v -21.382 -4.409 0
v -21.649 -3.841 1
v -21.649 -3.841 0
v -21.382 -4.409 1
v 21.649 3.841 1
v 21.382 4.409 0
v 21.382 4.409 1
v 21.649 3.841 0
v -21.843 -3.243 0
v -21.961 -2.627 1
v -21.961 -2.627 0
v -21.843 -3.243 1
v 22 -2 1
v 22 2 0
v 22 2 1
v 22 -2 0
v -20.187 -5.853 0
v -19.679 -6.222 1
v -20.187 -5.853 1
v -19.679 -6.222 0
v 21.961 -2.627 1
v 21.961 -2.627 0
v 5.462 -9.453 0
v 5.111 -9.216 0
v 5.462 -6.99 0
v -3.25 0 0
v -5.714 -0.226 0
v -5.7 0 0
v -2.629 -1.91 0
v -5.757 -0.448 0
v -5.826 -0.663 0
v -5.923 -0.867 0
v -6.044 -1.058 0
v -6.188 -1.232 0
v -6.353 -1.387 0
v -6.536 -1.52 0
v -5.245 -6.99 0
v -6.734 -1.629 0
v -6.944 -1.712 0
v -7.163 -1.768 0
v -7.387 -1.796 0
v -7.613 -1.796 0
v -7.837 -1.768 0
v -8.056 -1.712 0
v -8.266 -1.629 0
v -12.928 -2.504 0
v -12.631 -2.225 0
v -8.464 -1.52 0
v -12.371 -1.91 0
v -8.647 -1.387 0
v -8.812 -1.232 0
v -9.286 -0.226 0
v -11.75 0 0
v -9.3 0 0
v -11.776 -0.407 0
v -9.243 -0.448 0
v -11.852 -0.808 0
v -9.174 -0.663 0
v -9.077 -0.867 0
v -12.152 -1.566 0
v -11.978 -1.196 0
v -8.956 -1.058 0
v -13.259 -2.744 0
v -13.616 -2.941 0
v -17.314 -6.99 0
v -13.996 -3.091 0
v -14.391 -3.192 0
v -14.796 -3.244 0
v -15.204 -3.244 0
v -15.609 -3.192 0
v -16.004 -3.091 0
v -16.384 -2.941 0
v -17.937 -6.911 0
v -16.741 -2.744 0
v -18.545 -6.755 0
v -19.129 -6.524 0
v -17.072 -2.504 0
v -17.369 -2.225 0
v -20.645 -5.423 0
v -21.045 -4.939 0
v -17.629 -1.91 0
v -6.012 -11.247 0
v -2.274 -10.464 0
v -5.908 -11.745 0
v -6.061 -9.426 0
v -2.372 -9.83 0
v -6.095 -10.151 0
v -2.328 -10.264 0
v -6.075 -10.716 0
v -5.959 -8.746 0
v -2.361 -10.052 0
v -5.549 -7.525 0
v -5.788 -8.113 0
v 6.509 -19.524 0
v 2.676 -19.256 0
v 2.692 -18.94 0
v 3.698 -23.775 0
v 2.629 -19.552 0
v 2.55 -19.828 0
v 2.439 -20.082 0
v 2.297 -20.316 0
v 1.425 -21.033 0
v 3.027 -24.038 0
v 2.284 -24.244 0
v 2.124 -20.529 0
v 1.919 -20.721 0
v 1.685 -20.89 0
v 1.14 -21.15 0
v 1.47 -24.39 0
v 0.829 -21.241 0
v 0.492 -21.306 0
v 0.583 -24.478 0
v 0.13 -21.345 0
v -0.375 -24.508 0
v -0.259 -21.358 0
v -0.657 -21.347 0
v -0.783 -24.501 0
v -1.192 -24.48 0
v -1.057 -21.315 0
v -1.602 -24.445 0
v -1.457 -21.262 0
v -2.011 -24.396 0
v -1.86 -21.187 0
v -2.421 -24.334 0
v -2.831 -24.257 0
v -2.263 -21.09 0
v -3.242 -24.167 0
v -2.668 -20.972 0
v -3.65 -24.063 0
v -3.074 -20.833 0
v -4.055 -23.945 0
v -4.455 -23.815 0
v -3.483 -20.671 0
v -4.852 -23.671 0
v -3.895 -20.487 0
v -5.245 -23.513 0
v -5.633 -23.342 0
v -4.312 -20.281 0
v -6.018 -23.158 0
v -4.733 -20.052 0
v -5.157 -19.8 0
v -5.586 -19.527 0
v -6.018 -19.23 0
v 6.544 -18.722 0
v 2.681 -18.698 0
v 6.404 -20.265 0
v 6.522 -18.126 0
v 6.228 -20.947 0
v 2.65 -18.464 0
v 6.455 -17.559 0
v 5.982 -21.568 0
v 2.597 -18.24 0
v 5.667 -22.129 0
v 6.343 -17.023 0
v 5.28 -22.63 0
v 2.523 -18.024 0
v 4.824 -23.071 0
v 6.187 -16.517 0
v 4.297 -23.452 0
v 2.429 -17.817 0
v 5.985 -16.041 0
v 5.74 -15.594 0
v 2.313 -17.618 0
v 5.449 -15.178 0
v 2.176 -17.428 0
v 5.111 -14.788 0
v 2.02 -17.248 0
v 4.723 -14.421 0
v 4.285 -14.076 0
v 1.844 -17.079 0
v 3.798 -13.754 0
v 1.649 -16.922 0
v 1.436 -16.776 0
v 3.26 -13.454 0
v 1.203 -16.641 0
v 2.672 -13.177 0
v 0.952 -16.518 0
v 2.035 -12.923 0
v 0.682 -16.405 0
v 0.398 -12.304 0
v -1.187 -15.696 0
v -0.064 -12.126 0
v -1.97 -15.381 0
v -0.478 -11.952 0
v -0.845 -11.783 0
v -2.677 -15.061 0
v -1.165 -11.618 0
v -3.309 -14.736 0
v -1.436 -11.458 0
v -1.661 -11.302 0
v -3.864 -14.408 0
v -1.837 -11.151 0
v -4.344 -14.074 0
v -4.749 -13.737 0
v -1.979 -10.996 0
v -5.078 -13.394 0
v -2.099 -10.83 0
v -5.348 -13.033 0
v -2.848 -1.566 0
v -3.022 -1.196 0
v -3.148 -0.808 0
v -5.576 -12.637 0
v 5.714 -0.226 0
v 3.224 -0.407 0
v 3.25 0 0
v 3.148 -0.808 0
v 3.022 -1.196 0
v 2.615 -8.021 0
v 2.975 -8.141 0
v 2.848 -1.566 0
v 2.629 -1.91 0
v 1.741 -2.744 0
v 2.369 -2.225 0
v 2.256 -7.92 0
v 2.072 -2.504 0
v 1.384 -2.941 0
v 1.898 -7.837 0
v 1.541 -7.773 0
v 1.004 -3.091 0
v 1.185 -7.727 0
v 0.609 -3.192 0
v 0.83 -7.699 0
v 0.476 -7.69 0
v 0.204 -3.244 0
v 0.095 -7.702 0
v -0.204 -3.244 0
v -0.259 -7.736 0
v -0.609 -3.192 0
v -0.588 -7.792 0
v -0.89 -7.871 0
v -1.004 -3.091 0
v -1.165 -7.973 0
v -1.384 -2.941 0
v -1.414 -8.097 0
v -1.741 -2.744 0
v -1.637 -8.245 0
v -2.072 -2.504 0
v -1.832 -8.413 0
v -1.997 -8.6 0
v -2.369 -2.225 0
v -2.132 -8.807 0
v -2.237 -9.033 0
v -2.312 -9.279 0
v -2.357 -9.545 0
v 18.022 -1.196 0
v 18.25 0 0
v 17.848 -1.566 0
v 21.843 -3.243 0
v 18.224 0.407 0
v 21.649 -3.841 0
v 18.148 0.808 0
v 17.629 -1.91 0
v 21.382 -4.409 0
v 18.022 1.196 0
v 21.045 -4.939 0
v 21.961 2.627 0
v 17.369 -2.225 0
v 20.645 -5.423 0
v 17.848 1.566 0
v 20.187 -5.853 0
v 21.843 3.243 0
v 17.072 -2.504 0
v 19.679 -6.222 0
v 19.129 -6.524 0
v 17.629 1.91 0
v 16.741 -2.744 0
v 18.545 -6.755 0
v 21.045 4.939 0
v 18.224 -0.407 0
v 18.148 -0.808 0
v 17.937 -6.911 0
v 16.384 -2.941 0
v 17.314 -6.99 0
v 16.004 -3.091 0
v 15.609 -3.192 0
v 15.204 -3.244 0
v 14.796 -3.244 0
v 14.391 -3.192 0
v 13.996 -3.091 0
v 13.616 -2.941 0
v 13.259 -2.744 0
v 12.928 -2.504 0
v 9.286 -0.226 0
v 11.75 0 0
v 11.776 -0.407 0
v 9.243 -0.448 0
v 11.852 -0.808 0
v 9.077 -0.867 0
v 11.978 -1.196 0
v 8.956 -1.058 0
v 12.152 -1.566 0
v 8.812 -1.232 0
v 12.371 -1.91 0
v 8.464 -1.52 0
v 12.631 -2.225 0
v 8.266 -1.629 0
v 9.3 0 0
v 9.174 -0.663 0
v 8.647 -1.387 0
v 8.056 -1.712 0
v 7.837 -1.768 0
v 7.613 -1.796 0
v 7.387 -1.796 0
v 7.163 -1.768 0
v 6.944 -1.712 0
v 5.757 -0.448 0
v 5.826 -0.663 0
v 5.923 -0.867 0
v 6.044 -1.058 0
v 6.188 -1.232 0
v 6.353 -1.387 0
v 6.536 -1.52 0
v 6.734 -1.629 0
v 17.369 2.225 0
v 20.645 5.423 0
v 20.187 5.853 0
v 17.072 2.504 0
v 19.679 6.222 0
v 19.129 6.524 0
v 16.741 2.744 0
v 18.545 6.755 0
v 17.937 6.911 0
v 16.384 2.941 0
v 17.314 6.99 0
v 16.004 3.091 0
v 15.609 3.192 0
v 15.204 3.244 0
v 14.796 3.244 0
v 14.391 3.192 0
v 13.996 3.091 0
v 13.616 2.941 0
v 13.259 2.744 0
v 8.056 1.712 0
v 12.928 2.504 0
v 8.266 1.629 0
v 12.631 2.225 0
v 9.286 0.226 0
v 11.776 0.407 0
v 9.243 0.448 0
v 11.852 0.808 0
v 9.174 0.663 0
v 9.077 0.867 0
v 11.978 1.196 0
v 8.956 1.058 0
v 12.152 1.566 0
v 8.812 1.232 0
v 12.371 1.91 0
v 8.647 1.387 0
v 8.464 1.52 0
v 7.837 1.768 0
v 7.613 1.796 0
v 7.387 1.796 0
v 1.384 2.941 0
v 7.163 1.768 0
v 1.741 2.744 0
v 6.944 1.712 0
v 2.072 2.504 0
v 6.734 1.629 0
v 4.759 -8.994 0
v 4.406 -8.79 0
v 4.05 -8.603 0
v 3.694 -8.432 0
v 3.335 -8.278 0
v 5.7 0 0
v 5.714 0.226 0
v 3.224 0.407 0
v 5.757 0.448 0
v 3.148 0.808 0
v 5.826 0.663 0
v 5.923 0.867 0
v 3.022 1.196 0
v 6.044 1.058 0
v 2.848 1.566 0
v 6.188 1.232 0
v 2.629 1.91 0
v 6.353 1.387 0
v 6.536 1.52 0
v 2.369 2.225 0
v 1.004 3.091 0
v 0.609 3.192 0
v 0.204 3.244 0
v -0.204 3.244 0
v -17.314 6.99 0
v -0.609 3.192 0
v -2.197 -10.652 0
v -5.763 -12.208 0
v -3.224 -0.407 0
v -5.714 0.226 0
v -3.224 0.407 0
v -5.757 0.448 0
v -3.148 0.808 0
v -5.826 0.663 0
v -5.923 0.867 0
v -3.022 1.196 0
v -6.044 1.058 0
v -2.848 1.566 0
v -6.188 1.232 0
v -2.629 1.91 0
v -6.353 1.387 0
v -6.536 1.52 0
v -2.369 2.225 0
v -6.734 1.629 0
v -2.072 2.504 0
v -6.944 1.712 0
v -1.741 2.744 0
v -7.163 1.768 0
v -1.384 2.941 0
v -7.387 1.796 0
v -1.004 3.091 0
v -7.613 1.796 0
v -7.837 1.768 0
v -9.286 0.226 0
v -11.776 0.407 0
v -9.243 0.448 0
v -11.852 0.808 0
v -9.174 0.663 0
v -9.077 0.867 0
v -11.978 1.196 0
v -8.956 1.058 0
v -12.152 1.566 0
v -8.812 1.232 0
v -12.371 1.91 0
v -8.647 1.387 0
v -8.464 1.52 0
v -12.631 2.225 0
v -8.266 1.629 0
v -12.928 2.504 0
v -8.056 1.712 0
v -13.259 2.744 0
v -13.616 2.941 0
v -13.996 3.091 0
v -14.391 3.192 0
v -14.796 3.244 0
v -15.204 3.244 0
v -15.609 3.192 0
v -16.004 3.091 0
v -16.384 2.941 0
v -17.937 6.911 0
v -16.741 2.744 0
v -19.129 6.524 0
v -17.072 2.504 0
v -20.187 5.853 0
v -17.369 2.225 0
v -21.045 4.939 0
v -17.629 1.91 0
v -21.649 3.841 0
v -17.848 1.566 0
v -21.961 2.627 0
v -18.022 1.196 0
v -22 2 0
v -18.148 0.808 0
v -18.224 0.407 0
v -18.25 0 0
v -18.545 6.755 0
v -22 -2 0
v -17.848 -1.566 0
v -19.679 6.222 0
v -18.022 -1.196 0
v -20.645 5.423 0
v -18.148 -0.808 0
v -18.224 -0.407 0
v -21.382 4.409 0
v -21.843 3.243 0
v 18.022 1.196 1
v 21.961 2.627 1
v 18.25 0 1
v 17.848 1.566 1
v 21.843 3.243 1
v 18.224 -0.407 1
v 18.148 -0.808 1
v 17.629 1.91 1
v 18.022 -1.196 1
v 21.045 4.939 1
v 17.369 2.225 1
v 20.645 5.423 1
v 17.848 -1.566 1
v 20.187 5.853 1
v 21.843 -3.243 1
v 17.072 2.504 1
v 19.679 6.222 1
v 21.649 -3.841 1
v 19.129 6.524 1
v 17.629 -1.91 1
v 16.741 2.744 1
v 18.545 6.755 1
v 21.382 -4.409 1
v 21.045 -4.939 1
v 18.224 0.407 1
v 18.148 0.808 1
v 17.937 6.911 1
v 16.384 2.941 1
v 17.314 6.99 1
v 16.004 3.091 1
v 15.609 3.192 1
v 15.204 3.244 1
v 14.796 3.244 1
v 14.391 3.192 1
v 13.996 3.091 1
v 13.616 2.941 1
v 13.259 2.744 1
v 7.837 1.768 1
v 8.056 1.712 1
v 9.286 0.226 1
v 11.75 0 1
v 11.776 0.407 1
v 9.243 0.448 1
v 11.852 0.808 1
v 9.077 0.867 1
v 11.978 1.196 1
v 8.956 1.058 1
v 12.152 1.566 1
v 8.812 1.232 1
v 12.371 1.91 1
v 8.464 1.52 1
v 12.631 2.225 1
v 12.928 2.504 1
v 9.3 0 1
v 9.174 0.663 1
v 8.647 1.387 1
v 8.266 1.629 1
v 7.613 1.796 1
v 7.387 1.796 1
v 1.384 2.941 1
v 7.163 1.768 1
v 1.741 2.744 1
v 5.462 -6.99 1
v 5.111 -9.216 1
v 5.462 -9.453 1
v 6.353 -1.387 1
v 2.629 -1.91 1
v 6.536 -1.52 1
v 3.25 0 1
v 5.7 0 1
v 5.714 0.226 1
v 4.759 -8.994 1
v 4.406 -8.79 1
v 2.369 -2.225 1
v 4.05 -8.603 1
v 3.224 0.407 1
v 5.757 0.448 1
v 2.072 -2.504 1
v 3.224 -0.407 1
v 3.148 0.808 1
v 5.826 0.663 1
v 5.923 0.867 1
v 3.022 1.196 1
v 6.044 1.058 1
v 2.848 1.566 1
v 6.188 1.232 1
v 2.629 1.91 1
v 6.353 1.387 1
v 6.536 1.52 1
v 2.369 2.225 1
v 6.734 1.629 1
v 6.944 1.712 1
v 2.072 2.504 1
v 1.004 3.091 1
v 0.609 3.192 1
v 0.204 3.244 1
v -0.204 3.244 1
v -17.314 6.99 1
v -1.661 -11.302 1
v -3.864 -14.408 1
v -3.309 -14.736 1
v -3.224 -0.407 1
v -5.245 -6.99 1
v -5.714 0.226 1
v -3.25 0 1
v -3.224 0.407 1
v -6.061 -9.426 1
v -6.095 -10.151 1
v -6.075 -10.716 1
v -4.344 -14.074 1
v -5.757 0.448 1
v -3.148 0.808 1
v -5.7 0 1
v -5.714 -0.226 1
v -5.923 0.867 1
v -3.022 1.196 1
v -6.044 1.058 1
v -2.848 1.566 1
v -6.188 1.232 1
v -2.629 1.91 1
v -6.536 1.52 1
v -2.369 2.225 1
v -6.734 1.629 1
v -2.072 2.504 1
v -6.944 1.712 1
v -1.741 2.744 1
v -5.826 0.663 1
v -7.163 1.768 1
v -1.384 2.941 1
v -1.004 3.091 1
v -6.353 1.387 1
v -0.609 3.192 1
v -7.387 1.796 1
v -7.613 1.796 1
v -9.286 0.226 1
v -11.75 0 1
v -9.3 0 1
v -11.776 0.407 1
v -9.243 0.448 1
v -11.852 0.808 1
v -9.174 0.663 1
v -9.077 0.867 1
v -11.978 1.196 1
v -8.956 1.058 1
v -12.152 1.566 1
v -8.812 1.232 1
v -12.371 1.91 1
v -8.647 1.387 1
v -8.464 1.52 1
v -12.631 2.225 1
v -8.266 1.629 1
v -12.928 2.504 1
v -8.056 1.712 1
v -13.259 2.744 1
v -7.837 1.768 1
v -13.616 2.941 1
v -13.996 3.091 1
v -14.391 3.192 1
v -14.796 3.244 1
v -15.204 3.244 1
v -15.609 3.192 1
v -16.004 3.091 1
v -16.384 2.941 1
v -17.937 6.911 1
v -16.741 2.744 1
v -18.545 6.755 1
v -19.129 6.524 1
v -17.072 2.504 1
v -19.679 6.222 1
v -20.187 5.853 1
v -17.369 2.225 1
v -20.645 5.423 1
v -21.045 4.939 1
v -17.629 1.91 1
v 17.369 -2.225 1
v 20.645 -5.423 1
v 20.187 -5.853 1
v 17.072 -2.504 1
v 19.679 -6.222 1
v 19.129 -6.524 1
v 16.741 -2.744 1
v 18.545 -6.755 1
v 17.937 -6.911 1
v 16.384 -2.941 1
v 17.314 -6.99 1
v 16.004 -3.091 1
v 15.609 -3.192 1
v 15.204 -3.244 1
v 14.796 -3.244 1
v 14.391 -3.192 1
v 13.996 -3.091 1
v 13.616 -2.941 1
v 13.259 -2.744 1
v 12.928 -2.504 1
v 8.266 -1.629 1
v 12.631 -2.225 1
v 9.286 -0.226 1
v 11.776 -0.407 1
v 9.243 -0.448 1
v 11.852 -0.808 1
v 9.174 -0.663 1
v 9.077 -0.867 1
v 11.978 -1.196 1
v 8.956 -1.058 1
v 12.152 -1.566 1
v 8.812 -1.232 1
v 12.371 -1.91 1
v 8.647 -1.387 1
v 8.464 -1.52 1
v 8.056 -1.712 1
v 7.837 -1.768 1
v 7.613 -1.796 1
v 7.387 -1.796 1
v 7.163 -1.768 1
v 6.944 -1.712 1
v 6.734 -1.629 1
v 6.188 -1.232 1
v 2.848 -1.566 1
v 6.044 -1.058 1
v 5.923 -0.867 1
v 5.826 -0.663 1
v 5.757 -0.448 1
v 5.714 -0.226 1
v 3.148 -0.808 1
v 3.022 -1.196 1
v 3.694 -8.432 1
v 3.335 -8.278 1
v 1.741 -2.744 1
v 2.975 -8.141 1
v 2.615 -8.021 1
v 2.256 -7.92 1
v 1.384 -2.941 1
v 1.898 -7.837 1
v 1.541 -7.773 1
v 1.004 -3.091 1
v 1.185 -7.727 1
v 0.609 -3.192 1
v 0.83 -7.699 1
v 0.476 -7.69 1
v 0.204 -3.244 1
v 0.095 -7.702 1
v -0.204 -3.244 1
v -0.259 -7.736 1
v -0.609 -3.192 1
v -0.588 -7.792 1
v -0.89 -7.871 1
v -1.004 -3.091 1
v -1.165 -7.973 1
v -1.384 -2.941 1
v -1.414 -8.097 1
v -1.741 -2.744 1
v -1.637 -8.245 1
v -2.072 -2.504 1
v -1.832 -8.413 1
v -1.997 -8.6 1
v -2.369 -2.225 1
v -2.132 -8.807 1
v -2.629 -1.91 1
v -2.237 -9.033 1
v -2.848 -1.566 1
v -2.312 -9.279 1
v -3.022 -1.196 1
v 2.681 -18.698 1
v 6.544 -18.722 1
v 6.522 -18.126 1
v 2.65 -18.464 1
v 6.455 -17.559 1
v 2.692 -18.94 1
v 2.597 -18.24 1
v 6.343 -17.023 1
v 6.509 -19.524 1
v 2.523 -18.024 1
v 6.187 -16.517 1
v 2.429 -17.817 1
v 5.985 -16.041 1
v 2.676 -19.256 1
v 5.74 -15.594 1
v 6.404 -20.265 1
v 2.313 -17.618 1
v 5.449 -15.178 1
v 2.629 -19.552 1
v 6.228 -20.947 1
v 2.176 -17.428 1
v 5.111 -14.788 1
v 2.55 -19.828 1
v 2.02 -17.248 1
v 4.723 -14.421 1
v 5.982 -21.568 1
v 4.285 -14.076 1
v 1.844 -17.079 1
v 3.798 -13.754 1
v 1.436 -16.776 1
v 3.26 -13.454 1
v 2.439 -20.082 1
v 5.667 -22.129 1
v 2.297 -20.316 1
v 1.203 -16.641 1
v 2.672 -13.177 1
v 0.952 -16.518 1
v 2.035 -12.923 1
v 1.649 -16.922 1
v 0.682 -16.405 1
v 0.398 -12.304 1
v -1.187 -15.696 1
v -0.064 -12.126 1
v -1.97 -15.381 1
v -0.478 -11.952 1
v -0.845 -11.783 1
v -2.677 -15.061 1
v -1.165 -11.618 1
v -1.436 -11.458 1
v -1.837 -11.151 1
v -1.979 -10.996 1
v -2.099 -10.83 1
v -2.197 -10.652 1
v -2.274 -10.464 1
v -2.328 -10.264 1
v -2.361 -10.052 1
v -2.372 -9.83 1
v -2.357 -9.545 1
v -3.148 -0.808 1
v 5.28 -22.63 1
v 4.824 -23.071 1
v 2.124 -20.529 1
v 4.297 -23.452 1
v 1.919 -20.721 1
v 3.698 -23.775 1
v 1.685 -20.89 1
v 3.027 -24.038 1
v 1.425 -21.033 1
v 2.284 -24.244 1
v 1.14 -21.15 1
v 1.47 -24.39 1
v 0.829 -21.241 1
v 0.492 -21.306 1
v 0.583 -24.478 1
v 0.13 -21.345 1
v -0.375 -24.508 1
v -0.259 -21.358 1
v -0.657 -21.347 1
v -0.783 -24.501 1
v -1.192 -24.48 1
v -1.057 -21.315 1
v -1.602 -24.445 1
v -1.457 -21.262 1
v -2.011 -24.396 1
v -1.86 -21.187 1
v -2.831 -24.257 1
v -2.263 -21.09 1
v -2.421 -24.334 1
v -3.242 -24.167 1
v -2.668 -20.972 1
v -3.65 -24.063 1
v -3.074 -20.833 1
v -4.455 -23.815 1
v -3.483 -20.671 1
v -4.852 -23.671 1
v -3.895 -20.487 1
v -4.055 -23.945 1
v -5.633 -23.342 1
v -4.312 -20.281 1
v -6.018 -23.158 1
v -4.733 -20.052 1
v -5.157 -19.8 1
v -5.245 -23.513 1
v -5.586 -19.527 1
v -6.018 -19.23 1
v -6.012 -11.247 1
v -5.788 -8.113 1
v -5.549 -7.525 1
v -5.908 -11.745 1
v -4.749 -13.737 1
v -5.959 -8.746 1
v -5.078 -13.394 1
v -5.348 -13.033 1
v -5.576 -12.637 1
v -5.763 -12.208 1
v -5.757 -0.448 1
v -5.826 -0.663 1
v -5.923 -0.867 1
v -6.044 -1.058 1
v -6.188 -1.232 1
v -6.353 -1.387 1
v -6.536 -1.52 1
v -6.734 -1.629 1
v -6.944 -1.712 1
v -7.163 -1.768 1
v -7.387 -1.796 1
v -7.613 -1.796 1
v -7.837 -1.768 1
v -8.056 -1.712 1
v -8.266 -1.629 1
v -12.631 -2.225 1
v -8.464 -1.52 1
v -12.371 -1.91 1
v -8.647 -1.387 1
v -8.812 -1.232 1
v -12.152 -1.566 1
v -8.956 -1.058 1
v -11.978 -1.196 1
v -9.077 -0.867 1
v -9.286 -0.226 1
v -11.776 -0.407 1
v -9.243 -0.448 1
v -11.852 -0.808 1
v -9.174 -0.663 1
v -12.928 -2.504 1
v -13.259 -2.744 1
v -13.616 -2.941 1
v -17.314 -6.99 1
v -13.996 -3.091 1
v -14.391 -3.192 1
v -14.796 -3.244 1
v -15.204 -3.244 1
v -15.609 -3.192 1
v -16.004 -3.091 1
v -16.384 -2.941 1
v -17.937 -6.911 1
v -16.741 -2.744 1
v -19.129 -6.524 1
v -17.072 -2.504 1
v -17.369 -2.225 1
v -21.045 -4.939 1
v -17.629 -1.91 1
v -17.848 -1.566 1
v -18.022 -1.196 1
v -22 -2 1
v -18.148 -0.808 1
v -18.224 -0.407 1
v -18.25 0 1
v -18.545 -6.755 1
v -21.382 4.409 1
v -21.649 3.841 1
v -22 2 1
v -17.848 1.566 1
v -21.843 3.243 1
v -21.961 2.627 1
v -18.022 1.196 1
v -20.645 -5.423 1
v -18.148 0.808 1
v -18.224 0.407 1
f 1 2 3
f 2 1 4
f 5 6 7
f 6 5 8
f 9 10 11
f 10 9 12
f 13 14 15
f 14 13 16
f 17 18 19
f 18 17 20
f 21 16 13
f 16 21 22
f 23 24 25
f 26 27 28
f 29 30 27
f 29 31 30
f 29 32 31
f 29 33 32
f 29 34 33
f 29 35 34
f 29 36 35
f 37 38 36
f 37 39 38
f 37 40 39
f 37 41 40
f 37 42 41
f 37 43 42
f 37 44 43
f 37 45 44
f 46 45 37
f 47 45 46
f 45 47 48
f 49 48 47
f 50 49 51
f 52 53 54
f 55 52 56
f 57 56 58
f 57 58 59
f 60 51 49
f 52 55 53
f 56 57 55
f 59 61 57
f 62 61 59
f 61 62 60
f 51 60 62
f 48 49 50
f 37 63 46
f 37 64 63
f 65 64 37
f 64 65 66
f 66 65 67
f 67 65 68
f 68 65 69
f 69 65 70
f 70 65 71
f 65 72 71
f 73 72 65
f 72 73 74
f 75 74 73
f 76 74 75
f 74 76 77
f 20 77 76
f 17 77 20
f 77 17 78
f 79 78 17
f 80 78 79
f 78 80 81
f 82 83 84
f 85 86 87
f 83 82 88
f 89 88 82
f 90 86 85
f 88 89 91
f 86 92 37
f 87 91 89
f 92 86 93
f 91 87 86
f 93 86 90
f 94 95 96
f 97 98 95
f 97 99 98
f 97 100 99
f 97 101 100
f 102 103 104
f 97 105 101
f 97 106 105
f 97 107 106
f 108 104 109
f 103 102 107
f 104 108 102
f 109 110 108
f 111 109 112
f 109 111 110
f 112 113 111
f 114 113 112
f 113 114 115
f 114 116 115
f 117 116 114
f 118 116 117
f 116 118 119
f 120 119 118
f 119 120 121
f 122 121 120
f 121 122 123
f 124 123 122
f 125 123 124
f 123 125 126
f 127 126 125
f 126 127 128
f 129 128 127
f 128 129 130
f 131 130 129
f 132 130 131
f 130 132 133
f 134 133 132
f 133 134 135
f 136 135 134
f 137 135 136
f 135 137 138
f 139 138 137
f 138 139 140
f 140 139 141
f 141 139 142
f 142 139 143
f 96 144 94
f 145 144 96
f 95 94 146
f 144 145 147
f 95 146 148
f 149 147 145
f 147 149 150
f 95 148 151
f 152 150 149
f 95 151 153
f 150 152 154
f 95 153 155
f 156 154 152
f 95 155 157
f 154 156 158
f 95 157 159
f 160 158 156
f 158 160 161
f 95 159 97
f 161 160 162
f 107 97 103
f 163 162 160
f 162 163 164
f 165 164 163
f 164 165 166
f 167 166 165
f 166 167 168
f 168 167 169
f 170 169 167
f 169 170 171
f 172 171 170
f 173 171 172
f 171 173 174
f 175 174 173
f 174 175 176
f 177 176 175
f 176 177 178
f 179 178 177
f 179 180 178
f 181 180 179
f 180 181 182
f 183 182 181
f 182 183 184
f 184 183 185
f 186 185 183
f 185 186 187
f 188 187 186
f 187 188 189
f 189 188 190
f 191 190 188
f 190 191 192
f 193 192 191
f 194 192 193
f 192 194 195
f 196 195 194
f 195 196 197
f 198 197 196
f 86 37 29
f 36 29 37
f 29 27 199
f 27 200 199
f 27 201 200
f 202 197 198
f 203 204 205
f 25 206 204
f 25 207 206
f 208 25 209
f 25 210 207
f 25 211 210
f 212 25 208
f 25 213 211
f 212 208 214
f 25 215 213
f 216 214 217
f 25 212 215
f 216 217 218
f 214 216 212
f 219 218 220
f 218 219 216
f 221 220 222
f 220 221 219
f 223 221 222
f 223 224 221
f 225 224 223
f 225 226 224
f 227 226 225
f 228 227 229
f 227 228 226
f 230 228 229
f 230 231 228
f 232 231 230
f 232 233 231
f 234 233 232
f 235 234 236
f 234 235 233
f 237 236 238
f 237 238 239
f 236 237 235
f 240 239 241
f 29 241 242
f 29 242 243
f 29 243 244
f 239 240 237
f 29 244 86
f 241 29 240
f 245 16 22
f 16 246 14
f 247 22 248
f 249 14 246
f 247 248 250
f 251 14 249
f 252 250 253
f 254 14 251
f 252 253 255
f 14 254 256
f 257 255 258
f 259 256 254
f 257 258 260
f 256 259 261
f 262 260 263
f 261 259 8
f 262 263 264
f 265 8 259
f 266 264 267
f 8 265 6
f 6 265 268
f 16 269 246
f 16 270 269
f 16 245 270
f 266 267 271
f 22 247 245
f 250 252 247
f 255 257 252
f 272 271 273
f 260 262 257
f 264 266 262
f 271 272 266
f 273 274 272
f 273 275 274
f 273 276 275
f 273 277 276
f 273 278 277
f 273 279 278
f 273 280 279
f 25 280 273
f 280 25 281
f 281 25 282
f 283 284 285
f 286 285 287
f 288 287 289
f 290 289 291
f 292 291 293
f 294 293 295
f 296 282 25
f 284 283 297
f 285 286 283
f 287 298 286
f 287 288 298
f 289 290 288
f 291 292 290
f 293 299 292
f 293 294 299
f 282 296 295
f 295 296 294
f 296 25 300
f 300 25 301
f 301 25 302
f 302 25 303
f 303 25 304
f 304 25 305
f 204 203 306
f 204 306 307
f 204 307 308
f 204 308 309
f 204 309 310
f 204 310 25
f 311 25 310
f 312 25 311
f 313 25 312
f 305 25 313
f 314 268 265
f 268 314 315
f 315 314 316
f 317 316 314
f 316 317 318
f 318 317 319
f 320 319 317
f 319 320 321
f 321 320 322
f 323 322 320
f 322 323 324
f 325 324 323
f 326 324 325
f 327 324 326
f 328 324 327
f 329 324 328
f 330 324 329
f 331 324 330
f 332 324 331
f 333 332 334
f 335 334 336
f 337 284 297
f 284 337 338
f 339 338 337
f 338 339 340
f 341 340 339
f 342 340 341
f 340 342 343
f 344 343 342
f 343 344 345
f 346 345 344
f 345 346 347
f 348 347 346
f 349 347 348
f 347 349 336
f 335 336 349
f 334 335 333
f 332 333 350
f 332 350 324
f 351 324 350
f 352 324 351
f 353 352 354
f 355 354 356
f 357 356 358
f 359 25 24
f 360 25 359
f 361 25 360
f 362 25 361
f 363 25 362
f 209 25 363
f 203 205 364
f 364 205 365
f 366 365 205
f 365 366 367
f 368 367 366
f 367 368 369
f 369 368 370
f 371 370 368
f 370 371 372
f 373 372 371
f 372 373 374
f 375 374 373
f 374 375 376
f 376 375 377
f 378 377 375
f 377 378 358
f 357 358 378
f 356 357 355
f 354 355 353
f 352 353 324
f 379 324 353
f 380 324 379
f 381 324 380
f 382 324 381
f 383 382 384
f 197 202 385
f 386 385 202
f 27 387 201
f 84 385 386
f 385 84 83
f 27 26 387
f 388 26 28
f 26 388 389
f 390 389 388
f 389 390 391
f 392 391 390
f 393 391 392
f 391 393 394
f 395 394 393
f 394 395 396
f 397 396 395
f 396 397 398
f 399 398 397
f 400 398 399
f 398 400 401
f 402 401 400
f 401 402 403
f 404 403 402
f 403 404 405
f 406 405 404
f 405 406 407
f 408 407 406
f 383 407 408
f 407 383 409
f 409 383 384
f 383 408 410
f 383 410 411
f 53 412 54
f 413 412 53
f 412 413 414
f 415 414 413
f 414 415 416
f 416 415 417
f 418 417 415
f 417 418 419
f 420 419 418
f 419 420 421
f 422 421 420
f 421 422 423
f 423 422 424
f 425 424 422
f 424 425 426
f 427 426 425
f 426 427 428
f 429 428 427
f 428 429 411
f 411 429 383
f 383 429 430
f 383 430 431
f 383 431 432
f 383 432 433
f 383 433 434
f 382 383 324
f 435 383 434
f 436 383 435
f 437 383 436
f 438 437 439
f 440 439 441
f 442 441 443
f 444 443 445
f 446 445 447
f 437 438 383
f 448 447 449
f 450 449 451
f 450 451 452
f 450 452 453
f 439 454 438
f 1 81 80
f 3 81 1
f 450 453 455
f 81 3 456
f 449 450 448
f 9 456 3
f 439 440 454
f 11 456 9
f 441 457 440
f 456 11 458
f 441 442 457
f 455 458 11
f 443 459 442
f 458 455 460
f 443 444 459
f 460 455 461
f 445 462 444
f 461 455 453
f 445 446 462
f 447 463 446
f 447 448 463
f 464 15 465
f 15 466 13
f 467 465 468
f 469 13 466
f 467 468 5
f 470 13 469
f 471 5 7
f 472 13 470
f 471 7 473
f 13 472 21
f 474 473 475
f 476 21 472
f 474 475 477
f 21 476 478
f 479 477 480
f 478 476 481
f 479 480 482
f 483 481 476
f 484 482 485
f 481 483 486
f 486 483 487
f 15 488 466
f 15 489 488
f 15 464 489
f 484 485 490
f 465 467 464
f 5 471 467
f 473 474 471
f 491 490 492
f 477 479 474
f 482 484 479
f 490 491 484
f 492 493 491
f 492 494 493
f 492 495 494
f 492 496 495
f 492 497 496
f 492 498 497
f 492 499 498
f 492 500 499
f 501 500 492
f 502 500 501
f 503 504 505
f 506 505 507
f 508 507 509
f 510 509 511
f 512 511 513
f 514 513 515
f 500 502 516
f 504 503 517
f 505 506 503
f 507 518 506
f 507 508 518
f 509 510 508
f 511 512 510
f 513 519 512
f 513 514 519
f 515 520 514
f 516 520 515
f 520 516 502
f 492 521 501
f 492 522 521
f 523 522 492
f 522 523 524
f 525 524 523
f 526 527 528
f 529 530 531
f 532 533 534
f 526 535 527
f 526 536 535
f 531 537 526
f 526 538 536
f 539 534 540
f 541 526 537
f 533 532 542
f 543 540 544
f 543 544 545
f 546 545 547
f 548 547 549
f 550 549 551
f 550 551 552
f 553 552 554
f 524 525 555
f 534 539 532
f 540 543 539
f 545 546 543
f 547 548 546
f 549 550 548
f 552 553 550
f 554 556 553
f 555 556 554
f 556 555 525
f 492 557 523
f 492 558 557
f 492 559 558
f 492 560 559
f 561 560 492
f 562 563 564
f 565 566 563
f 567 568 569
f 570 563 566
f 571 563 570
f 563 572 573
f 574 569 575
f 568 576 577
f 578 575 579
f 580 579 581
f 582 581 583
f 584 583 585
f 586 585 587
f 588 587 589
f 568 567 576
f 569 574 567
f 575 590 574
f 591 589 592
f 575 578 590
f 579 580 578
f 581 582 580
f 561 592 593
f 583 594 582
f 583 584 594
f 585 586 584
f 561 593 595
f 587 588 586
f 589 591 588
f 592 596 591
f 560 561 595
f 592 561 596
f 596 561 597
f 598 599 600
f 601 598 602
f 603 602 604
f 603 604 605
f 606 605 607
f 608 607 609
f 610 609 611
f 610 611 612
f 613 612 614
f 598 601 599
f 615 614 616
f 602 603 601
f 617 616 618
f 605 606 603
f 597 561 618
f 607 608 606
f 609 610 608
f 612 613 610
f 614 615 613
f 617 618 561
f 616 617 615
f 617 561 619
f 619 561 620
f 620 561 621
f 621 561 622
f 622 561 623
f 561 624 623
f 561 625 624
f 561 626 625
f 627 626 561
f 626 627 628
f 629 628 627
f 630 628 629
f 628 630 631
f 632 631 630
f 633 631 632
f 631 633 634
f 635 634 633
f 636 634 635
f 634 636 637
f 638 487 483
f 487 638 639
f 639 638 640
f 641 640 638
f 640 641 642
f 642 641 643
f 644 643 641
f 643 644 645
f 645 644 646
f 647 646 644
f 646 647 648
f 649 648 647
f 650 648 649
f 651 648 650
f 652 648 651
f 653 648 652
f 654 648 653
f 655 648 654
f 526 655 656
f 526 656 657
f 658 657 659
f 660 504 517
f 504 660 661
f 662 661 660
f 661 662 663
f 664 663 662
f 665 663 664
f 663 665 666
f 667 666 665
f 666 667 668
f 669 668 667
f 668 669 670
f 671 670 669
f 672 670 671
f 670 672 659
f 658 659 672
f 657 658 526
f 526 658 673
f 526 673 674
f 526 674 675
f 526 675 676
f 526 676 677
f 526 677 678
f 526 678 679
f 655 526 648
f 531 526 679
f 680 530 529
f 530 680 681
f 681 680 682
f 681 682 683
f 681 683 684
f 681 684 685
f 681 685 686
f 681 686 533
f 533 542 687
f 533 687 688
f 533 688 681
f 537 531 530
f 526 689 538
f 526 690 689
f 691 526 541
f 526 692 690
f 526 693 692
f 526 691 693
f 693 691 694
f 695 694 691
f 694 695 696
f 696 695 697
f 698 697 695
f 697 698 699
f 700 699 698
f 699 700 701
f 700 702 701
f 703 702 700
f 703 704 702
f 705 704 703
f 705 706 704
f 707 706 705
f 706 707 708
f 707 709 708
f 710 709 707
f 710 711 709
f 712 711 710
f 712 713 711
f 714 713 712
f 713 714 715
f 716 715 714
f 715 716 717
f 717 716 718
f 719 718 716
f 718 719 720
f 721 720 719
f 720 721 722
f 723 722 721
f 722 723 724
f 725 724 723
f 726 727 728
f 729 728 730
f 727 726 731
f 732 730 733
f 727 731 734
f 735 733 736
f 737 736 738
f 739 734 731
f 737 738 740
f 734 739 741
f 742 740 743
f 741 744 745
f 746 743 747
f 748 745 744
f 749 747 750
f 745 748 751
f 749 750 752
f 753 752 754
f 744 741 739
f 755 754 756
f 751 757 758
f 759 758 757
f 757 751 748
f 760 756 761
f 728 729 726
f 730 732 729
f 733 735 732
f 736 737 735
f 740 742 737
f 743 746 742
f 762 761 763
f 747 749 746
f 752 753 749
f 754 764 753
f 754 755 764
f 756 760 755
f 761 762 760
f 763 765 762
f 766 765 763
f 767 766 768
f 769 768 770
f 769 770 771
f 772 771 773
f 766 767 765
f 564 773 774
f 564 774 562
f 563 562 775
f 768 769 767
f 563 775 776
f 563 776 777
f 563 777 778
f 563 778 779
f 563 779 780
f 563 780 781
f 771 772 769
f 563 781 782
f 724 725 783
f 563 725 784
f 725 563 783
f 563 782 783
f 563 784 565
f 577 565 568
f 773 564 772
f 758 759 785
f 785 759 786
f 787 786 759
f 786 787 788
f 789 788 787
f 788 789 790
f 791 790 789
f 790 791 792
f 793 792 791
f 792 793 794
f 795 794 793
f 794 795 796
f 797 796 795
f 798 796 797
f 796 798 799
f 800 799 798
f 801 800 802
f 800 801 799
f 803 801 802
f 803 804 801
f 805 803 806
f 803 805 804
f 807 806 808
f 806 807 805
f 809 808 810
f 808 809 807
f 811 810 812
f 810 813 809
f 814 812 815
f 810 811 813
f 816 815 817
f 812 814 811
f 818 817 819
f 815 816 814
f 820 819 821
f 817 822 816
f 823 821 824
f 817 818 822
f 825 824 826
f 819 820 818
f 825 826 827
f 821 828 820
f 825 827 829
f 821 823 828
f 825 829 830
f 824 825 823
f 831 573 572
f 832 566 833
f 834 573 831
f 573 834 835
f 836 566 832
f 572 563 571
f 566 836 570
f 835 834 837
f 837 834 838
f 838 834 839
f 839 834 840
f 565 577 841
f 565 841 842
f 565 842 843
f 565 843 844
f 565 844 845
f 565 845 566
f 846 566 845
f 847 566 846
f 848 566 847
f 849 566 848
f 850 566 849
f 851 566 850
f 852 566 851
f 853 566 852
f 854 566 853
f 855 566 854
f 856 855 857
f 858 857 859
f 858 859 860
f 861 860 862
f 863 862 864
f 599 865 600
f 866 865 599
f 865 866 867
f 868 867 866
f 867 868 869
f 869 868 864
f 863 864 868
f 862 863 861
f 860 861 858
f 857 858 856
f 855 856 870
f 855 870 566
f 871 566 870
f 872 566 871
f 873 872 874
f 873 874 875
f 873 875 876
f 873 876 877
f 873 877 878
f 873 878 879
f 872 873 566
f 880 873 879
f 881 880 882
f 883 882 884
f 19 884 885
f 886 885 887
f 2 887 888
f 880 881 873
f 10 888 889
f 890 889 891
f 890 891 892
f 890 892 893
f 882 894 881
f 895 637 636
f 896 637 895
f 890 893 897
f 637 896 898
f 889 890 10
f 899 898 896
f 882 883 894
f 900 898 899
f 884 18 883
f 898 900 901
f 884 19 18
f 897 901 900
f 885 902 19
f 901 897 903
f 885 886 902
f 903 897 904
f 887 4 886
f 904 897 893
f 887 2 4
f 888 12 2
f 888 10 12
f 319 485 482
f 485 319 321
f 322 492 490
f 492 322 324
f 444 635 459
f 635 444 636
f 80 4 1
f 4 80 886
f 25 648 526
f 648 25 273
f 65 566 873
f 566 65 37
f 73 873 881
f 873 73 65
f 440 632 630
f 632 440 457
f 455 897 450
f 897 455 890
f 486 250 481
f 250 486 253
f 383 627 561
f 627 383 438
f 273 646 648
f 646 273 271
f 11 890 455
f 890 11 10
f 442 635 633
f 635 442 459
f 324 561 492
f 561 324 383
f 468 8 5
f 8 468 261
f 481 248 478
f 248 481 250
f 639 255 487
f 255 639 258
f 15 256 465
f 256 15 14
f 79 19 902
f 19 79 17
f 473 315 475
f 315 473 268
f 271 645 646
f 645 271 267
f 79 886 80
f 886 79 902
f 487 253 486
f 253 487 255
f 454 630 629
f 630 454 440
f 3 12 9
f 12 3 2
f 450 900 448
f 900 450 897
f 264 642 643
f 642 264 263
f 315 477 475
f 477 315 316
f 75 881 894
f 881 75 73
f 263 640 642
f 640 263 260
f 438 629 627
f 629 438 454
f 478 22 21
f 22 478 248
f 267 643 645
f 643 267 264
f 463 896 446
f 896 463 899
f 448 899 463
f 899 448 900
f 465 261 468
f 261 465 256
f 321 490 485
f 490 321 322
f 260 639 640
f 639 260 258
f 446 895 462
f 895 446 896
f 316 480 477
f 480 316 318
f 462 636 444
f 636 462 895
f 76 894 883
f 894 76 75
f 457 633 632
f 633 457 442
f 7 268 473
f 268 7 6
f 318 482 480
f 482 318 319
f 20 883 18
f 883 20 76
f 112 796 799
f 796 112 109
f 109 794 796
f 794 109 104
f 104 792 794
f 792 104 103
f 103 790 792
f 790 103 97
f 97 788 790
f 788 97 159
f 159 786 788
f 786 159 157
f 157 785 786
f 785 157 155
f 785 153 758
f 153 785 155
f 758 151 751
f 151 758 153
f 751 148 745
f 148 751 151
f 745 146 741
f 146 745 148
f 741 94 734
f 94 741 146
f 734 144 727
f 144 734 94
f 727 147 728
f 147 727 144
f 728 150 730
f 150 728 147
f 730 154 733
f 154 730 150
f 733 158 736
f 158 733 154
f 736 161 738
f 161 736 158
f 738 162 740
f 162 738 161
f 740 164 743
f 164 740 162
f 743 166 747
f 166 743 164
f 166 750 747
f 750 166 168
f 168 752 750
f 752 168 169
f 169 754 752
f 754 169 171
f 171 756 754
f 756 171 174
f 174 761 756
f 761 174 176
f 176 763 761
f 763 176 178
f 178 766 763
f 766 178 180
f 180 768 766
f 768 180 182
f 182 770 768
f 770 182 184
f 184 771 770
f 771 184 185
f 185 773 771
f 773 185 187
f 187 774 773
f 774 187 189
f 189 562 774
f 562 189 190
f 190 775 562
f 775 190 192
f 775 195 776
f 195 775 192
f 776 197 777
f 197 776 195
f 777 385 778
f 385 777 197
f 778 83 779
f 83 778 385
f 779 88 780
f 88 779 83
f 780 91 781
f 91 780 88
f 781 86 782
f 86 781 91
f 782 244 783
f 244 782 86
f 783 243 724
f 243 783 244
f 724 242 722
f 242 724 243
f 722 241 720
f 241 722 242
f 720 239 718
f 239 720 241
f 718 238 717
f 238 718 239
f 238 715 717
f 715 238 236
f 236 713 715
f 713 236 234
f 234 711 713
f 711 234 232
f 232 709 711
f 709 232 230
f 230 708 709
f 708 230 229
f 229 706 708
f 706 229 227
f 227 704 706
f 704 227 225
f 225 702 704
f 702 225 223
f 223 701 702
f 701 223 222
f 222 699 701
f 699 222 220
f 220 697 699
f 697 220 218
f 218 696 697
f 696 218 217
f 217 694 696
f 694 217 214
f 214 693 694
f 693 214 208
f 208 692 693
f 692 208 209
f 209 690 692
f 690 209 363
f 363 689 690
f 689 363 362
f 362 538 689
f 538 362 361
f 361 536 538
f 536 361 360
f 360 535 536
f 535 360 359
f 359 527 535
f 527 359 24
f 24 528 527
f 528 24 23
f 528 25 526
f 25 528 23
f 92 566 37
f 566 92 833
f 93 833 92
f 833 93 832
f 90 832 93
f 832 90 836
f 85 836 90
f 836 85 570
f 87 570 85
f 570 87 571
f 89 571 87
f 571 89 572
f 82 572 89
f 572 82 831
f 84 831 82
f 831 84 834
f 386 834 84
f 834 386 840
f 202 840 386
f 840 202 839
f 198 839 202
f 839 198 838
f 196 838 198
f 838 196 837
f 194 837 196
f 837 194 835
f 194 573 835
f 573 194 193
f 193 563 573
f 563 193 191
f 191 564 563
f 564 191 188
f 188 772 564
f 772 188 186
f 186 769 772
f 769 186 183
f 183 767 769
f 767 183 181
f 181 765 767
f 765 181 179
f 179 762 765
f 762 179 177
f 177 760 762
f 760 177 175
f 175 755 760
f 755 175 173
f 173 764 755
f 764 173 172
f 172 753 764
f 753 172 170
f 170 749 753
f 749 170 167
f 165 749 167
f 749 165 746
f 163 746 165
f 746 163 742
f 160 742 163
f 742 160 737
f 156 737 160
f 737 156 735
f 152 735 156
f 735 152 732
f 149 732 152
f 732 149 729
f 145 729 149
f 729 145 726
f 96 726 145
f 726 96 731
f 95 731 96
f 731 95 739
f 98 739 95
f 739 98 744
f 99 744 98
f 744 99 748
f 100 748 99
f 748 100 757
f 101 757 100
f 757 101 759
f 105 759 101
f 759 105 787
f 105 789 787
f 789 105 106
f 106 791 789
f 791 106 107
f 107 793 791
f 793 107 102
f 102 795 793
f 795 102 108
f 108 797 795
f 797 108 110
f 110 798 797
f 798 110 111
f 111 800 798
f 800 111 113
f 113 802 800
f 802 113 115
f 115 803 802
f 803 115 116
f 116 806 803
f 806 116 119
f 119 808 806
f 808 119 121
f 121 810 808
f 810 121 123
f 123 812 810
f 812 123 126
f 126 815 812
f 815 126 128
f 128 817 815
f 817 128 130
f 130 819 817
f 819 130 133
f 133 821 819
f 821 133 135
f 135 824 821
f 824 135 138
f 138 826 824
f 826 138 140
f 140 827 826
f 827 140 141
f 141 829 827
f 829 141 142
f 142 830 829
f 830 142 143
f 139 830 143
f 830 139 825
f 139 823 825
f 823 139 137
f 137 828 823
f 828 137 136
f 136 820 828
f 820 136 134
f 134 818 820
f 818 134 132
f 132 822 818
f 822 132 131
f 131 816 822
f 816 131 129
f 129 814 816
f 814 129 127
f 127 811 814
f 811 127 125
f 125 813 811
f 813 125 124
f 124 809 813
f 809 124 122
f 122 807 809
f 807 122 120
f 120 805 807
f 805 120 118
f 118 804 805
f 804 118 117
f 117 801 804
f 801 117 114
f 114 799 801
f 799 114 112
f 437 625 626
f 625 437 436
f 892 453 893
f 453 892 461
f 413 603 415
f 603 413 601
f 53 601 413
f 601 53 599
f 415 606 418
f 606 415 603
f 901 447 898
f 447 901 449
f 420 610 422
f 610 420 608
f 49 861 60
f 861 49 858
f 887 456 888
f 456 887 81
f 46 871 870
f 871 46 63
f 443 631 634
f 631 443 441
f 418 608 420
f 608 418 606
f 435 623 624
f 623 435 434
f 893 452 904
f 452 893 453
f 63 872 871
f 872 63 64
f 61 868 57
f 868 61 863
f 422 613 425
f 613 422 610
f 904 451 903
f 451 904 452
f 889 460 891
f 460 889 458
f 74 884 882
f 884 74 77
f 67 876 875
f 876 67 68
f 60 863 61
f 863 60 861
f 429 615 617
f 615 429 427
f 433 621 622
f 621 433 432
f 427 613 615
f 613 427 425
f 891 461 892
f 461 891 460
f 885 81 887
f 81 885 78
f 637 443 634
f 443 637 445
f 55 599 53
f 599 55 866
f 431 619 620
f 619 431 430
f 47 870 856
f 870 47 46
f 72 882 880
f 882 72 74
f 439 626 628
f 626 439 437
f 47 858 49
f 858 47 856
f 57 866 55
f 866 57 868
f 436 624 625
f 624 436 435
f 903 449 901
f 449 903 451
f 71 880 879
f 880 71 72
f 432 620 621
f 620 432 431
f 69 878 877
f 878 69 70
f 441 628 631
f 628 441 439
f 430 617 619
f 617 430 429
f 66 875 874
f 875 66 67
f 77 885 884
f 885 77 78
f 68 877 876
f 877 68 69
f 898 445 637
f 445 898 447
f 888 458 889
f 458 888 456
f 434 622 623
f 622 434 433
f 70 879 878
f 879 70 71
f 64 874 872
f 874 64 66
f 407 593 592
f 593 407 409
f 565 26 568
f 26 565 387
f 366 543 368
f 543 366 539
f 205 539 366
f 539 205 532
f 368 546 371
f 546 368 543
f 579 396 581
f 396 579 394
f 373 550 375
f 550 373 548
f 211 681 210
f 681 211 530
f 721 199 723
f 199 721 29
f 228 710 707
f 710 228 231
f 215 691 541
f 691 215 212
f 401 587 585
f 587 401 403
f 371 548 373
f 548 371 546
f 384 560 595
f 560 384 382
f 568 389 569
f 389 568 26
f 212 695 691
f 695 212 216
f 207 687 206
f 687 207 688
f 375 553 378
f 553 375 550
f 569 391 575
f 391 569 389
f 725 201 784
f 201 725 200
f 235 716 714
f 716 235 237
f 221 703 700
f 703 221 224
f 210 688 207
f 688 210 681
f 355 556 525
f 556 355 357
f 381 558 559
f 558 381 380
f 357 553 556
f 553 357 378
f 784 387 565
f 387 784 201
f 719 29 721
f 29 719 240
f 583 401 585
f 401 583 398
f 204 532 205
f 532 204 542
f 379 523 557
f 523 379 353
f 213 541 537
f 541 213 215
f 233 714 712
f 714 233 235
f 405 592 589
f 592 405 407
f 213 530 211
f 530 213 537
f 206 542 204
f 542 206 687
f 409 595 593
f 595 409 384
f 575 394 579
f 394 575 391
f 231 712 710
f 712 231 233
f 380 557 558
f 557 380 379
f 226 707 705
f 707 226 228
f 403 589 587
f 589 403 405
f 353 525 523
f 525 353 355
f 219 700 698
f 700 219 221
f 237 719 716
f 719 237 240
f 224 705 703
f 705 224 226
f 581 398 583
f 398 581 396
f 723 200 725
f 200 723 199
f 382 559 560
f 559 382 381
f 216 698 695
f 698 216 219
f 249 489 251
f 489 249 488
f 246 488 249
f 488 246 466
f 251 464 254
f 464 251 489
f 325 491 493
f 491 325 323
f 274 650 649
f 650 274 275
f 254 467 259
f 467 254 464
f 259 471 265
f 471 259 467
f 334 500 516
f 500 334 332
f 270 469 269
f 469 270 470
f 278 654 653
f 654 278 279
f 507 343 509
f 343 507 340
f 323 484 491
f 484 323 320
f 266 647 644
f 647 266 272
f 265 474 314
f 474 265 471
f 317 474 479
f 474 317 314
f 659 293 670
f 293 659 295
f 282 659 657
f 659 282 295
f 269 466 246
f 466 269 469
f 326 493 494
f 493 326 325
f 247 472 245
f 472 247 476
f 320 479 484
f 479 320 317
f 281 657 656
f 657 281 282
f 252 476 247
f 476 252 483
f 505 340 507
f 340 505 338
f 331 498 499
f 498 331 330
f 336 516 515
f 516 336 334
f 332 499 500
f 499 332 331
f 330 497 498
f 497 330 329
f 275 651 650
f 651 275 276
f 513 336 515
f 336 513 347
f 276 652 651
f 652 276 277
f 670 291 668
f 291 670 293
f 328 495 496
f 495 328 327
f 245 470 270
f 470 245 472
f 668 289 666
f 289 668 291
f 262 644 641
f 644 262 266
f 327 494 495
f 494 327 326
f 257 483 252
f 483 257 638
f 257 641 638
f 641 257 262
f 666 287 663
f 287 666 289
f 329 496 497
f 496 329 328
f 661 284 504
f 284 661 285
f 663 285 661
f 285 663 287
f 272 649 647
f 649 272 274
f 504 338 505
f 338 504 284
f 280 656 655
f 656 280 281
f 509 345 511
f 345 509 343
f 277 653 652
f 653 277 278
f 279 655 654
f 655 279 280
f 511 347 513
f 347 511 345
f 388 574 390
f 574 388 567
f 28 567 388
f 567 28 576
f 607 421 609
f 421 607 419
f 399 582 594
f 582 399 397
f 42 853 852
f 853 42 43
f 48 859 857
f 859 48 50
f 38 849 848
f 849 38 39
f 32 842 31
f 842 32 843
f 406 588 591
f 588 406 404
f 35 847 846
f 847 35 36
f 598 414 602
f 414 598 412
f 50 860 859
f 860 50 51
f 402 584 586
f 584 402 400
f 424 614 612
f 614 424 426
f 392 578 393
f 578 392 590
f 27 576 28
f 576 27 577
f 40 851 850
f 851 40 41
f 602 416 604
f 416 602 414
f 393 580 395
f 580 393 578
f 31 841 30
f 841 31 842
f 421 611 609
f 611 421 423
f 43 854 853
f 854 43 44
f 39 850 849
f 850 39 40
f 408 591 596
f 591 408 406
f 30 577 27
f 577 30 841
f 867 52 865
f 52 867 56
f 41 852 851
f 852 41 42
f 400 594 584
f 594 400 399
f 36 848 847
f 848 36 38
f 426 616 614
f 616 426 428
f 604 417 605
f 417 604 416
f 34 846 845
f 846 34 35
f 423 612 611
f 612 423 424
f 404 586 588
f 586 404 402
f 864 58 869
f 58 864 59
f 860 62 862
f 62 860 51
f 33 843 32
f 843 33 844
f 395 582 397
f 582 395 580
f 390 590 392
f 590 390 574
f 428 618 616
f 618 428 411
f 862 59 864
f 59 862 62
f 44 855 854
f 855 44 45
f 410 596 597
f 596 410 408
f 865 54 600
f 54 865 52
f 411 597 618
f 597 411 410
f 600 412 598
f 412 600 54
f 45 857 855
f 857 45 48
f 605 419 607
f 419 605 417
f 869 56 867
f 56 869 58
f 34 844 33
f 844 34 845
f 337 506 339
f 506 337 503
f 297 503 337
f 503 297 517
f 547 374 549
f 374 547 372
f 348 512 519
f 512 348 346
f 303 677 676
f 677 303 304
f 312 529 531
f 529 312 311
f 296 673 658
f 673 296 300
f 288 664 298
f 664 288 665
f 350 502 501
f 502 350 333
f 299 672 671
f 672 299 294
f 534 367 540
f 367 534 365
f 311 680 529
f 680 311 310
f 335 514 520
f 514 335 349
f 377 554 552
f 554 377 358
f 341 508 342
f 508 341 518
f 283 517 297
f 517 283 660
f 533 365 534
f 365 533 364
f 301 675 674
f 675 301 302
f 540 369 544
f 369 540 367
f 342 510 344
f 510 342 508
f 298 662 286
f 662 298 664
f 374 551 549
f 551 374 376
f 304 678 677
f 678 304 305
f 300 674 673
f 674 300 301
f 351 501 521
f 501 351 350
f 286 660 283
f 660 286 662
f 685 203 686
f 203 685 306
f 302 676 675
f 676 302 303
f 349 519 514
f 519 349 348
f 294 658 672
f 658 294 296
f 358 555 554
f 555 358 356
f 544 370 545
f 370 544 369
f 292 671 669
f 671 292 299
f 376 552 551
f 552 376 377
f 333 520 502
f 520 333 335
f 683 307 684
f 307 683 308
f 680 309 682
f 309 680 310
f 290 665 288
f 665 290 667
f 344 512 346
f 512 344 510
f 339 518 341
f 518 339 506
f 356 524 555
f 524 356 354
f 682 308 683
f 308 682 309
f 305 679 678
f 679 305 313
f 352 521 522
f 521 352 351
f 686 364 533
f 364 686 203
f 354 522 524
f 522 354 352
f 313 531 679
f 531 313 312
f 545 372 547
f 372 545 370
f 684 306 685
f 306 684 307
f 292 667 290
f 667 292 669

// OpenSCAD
$fn = 50;


difference() {
	union() {
		*color(alpha = 1.0000000000, c = "gray") {
			translate(v = [0, 14, 0]) {
				linear_extrude(height = 1) {
					text(font = "Arial:style=Bold", halign = "center", size = 4.5000000000, text = "COMMENT description oobb_plate_shape_p_type_1_depth_3_width_1_thickness_s_extra_oobb_size", valign = "center");
				}
			}
		}
		hull() {
			translate(v = [-17.0000000000, 2.0000000000, 0]) {
				cylinder(h = 1, r = 5);
			}
			translate(v = [17.0000000000, 2.0000000000, 0]) {
				cylinder(h = 1, r = 5);
			}
			translate(v = [-17.0000000000, -2.0000000000, 0]) {
				cylinder(h = 1, r = 5);
			}
			translate(v = [17.0000000000, -2.0000000000, 0]) {
				cylinder(h = 1, r = 5);
			}
		}
		translate(v = [0, -5, 0]) {
			linear_extrude(height = 1) {
				text(font = "DejaVu Sans Mono:style=Bold", halign = "center", size = 19.0000000000, text = "S", valign = "top");
			}
		}
	}
	union() {
		*color(alpha = 1.0000000000, c = "gray") {
			translate(v = [0, 14, 0]) {
				linear_extrude(height = 1) {
					text(font = "Arial:style=Bold", halign = "center", size = 4.5000000000, text = "COMMENT description oobb_holes_shape_n_type_3_width_1_thickness_s_extra_oobb_size_1_height_'all'_holes_true_both_holes", valign = "center");
				}
			}
		}
		translate(v = [-15.0000000000, 0.0000000000, 0]) {
			translate(v = [0, 0, -50]) {
				cylinder(h = 100, r = 3.2500000000);
			}
		}
		translate(v = [0, 0, -50]) {
			cylinder(h = 100, r = 3.2500000000);
		}
		translate(v = [15.0000000000, 0.0000000000, 0]) {
			translate(v = [0, 0, -50]) {
				cylinder(h = 100, r = 3.2500000000);
			}
		}
		translate(v = [-15.0000000000, 0.0000000000, 0]) {
			translate(v = [0, 0, -50]) {
				cylinder(h = 100, r = 1.8000000000);
			}
		}
		translate(v = [-7.5000000000, 0.0000000000, 0]) {
			translate(v = [0, 0, -50]) {
				cylinder(h = 100, r = 1.8000000000);
			}
		}
		translate(v = [0, 0, -50]) {
			cylinder(h = 100, r = 1.8000000000);
		}
		translate(v = [7.5000000000, 0.0000000000, 0]) {
			translate(v = [0, 0, -50]) {
				cylinder(h = 100, r = 1.8000000000);
			}
		}
		translate(v = [15.0000000000, 0.0000000000, 0]) {
			translate(v = [0, 0, -50]) {
				cylinder(h = 100, r = 1.8000000000);
			}
		}
	}
}
